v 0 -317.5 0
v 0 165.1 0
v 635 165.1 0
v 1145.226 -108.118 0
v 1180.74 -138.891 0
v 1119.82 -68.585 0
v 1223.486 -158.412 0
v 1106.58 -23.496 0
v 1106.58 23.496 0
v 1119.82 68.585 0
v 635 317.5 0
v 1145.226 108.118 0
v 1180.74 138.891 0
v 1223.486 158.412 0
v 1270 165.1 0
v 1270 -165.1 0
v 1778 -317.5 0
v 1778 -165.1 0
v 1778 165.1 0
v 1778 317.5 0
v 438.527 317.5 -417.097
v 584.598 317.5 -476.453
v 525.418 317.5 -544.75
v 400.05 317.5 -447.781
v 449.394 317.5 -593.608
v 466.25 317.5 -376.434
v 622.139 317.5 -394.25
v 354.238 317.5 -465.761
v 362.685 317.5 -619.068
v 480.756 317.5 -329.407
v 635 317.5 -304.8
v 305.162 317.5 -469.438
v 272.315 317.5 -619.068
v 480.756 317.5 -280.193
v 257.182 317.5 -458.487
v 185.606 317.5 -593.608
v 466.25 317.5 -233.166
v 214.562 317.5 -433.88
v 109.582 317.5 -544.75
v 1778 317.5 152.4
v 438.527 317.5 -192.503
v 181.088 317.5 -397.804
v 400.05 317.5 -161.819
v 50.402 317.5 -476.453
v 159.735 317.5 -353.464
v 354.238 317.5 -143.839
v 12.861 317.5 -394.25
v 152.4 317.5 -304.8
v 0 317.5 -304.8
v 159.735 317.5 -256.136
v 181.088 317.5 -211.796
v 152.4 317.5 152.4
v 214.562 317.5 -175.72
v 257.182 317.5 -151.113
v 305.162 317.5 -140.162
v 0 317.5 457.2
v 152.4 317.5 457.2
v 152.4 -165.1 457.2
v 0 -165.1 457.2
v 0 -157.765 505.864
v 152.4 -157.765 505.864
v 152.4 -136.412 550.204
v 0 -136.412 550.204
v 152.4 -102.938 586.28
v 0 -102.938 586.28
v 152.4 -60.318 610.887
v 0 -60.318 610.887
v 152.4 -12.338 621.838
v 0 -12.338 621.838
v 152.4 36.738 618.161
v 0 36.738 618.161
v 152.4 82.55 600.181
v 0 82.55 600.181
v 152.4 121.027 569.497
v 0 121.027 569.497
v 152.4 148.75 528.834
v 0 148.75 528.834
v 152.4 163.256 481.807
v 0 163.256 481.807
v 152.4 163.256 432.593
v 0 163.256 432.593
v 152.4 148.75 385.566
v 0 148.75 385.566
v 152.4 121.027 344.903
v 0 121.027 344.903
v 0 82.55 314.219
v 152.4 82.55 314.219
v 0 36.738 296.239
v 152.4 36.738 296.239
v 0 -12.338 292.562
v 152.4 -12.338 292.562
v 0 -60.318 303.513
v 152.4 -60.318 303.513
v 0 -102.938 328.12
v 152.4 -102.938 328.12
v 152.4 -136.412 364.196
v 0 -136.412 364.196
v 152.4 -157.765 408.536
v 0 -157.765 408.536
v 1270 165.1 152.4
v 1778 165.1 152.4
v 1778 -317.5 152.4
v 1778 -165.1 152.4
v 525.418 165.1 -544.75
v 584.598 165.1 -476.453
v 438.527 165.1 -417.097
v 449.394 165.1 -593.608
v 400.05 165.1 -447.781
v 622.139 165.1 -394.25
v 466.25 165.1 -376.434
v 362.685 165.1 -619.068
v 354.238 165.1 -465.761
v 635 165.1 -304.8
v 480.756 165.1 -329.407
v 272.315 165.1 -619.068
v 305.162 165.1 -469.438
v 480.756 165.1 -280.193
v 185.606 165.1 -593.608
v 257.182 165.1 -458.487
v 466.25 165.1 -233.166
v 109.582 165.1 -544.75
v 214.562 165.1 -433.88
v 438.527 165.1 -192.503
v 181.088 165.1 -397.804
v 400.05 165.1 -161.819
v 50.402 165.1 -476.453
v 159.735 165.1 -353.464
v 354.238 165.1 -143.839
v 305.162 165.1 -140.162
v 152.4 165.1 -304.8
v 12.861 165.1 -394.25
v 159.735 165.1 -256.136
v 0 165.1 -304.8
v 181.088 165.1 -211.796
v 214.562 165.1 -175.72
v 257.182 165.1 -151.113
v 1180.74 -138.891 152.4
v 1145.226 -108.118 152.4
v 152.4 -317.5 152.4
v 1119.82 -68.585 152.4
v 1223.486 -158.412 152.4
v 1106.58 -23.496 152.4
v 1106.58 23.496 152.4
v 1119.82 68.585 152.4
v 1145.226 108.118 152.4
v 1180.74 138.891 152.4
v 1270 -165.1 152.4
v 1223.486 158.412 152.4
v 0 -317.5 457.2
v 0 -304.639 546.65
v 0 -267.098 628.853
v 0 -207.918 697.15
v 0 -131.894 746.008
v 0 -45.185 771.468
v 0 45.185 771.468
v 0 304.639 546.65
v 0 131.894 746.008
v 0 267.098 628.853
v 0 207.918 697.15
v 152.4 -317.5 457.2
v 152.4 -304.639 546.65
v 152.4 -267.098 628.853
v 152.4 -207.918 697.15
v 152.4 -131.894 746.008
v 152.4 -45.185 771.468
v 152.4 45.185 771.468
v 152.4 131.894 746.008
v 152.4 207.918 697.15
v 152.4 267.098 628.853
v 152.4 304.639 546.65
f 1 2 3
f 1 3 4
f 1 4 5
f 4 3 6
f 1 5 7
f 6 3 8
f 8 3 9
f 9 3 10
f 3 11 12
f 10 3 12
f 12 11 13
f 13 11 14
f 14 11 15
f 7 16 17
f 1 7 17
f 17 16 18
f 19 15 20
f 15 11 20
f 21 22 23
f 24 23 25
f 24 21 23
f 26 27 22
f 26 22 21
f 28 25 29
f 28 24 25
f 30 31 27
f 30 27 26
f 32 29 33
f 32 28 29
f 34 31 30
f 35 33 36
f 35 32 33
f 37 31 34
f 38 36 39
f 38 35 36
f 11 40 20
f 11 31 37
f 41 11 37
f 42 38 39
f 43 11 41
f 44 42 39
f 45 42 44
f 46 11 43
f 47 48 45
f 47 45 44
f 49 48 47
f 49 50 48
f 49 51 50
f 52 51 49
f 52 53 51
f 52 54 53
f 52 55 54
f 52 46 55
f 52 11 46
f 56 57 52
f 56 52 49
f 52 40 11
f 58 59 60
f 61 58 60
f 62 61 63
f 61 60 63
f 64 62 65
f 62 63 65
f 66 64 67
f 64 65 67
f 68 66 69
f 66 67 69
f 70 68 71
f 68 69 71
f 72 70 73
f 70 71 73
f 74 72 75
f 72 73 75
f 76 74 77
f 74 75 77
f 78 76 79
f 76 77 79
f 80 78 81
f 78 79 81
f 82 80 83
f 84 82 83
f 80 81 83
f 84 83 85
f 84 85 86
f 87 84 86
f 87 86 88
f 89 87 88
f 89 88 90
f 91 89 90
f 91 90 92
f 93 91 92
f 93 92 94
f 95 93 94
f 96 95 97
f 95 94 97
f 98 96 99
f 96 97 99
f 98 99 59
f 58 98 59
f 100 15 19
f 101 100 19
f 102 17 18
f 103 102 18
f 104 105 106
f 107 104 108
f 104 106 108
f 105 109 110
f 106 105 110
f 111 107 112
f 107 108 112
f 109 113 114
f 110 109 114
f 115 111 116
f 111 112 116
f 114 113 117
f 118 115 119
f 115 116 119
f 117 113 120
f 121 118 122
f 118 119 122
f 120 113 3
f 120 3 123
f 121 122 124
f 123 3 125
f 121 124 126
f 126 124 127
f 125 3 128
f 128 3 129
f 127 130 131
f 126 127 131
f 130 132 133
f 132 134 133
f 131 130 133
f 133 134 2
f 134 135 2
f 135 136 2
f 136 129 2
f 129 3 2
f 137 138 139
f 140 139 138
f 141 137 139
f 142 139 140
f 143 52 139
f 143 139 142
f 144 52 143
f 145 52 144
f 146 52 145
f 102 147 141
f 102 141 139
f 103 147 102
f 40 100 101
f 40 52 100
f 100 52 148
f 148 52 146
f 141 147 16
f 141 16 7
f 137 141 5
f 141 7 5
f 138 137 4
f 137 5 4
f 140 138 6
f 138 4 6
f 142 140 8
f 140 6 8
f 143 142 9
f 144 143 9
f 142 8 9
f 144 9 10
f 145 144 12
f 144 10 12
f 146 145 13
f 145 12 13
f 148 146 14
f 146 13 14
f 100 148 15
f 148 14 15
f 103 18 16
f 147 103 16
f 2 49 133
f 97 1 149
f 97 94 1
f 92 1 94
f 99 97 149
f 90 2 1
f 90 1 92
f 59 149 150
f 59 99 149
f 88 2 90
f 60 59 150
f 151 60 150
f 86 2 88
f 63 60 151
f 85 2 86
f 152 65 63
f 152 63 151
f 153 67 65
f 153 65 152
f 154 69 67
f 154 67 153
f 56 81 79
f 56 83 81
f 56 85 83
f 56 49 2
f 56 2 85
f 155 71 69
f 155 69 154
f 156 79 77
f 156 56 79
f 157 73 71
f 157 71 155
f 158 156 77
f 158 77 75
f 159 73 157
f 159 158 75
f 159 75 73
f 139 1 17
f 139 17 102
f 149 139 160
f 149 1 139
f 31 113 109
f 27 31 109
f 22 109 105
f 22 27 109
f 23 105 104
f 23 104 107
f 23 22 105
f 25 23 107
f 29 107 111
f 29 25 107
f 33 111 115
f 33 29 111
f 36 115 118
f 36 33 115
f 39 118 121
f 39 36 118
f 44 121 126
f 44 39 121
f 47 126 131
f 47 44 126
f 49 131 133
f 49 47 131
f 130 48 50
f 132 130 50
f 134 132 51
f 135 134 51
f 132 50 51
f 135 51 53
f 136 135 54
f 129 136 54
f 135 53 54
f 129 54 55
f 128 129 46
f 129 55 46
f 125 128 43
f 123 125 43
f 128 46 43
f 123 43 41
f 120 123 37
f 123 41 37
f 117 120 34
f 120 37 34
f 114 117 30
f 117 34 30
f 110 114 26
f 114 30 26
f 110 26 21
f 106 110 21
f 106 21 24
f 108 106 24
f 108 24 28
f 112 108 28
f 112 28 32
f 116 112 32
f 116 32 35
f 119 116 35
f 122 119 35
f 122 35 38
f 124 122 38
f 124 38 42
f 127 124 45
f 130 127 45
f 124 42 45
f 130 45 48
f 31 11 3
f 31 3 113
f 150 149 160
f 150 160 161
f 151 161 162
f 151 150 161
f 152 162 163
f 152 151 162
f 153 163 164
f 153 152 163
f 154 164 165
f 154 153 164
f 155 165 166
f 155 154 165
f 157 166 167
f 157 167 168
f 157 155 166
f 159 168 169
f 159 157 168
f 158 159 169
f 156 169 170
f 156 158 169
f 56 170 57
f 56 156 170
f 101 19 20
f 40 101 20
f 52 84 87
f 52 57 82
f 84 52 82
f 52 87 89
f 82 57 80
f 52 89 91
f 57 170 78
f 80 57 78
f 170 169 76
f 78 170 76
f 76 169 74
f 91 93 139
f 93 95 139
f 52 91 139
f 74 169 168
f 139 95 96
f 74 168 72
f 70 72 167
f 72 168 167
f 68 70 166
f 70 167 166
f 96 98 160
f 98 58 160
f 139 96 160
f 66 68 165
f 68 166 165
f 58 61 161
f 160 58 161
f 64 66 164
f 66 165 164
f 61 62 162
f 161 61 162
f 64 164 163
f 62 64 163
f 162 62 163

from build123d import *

# Parameters (mm, degrees)
F1_DEPTH = 152.4
F2_R     = 165.1
F3_DEPTH = 152.4
F4_R     = 165.1
F5_DEPTH = 152.4


with BuildPart() as f1:
    # F0 (on Top) → F1 (new body)
    with BuildSketch(Plane.XY):
        with BuildLine():
            Line((0, 317.5), (0, -317.5))
            Line((0, -317.5), (1778, -317.5))
            Line((1778, -317.5), (1778, -165.1))
            Line((1778, -165.1), (1270, -165.1))
            ThreePointArc((1270, -165.1), (1104.9, 0), (1270, 165.1))
            Line((1270, 165.1), (1778, 165.1))
            Line((1778, 165.1), (1778, 317.5))
            Line((1778, 317.5), (0, 317.5))
        make_face()
    extrude(amount=F1_DEPTH)

    # F2 (on face) → F3 (join)
    with BuildSketch(Plane(origin=(0, 0, 0), x_dir=(0, -1, 0), z_dir=(-1, 0, 0))):
        with BuildLine():
            Line((-317.5, 457.2), (-317.5, 152.4))
            Line((-317.5, 152.4), (317.5, 152.4))
            Line((317.5, 152.4), (317.5, 457.2))
            ThreePointArc((317.5, 457.2), (0, 774.7), (-317.5, 457.2))
        make_face()
        with Locations((0, 457.2)):
            Circle(F2_R, mode=Mode.SUBTRACT)
    extrude(amount=-F3_DEPTH)

    # F4 (on face) → F5 (join)
    with BuildSketch(Plane(origin=(0, 317.5, 0), x_dir=(-1, 0, 0), z_dir=(0, 1, 0))):
        with BuildLine():
            Line((0, -304.8), (0, 0))
            Line((0, 0), (-635, 0))
            Line((-635, 0), (-635, -304.8))
            ThreePointArc((-635, -304.8), (-317.5, -622.3), (0, -304.8))
        make_face()
        with Locations((-317.5, -304.8)):
            Circle(F4_R, mode=Mode.SUBTRACT)
    extrude(amount=-F5_DEPTH)


solid = f1.part
